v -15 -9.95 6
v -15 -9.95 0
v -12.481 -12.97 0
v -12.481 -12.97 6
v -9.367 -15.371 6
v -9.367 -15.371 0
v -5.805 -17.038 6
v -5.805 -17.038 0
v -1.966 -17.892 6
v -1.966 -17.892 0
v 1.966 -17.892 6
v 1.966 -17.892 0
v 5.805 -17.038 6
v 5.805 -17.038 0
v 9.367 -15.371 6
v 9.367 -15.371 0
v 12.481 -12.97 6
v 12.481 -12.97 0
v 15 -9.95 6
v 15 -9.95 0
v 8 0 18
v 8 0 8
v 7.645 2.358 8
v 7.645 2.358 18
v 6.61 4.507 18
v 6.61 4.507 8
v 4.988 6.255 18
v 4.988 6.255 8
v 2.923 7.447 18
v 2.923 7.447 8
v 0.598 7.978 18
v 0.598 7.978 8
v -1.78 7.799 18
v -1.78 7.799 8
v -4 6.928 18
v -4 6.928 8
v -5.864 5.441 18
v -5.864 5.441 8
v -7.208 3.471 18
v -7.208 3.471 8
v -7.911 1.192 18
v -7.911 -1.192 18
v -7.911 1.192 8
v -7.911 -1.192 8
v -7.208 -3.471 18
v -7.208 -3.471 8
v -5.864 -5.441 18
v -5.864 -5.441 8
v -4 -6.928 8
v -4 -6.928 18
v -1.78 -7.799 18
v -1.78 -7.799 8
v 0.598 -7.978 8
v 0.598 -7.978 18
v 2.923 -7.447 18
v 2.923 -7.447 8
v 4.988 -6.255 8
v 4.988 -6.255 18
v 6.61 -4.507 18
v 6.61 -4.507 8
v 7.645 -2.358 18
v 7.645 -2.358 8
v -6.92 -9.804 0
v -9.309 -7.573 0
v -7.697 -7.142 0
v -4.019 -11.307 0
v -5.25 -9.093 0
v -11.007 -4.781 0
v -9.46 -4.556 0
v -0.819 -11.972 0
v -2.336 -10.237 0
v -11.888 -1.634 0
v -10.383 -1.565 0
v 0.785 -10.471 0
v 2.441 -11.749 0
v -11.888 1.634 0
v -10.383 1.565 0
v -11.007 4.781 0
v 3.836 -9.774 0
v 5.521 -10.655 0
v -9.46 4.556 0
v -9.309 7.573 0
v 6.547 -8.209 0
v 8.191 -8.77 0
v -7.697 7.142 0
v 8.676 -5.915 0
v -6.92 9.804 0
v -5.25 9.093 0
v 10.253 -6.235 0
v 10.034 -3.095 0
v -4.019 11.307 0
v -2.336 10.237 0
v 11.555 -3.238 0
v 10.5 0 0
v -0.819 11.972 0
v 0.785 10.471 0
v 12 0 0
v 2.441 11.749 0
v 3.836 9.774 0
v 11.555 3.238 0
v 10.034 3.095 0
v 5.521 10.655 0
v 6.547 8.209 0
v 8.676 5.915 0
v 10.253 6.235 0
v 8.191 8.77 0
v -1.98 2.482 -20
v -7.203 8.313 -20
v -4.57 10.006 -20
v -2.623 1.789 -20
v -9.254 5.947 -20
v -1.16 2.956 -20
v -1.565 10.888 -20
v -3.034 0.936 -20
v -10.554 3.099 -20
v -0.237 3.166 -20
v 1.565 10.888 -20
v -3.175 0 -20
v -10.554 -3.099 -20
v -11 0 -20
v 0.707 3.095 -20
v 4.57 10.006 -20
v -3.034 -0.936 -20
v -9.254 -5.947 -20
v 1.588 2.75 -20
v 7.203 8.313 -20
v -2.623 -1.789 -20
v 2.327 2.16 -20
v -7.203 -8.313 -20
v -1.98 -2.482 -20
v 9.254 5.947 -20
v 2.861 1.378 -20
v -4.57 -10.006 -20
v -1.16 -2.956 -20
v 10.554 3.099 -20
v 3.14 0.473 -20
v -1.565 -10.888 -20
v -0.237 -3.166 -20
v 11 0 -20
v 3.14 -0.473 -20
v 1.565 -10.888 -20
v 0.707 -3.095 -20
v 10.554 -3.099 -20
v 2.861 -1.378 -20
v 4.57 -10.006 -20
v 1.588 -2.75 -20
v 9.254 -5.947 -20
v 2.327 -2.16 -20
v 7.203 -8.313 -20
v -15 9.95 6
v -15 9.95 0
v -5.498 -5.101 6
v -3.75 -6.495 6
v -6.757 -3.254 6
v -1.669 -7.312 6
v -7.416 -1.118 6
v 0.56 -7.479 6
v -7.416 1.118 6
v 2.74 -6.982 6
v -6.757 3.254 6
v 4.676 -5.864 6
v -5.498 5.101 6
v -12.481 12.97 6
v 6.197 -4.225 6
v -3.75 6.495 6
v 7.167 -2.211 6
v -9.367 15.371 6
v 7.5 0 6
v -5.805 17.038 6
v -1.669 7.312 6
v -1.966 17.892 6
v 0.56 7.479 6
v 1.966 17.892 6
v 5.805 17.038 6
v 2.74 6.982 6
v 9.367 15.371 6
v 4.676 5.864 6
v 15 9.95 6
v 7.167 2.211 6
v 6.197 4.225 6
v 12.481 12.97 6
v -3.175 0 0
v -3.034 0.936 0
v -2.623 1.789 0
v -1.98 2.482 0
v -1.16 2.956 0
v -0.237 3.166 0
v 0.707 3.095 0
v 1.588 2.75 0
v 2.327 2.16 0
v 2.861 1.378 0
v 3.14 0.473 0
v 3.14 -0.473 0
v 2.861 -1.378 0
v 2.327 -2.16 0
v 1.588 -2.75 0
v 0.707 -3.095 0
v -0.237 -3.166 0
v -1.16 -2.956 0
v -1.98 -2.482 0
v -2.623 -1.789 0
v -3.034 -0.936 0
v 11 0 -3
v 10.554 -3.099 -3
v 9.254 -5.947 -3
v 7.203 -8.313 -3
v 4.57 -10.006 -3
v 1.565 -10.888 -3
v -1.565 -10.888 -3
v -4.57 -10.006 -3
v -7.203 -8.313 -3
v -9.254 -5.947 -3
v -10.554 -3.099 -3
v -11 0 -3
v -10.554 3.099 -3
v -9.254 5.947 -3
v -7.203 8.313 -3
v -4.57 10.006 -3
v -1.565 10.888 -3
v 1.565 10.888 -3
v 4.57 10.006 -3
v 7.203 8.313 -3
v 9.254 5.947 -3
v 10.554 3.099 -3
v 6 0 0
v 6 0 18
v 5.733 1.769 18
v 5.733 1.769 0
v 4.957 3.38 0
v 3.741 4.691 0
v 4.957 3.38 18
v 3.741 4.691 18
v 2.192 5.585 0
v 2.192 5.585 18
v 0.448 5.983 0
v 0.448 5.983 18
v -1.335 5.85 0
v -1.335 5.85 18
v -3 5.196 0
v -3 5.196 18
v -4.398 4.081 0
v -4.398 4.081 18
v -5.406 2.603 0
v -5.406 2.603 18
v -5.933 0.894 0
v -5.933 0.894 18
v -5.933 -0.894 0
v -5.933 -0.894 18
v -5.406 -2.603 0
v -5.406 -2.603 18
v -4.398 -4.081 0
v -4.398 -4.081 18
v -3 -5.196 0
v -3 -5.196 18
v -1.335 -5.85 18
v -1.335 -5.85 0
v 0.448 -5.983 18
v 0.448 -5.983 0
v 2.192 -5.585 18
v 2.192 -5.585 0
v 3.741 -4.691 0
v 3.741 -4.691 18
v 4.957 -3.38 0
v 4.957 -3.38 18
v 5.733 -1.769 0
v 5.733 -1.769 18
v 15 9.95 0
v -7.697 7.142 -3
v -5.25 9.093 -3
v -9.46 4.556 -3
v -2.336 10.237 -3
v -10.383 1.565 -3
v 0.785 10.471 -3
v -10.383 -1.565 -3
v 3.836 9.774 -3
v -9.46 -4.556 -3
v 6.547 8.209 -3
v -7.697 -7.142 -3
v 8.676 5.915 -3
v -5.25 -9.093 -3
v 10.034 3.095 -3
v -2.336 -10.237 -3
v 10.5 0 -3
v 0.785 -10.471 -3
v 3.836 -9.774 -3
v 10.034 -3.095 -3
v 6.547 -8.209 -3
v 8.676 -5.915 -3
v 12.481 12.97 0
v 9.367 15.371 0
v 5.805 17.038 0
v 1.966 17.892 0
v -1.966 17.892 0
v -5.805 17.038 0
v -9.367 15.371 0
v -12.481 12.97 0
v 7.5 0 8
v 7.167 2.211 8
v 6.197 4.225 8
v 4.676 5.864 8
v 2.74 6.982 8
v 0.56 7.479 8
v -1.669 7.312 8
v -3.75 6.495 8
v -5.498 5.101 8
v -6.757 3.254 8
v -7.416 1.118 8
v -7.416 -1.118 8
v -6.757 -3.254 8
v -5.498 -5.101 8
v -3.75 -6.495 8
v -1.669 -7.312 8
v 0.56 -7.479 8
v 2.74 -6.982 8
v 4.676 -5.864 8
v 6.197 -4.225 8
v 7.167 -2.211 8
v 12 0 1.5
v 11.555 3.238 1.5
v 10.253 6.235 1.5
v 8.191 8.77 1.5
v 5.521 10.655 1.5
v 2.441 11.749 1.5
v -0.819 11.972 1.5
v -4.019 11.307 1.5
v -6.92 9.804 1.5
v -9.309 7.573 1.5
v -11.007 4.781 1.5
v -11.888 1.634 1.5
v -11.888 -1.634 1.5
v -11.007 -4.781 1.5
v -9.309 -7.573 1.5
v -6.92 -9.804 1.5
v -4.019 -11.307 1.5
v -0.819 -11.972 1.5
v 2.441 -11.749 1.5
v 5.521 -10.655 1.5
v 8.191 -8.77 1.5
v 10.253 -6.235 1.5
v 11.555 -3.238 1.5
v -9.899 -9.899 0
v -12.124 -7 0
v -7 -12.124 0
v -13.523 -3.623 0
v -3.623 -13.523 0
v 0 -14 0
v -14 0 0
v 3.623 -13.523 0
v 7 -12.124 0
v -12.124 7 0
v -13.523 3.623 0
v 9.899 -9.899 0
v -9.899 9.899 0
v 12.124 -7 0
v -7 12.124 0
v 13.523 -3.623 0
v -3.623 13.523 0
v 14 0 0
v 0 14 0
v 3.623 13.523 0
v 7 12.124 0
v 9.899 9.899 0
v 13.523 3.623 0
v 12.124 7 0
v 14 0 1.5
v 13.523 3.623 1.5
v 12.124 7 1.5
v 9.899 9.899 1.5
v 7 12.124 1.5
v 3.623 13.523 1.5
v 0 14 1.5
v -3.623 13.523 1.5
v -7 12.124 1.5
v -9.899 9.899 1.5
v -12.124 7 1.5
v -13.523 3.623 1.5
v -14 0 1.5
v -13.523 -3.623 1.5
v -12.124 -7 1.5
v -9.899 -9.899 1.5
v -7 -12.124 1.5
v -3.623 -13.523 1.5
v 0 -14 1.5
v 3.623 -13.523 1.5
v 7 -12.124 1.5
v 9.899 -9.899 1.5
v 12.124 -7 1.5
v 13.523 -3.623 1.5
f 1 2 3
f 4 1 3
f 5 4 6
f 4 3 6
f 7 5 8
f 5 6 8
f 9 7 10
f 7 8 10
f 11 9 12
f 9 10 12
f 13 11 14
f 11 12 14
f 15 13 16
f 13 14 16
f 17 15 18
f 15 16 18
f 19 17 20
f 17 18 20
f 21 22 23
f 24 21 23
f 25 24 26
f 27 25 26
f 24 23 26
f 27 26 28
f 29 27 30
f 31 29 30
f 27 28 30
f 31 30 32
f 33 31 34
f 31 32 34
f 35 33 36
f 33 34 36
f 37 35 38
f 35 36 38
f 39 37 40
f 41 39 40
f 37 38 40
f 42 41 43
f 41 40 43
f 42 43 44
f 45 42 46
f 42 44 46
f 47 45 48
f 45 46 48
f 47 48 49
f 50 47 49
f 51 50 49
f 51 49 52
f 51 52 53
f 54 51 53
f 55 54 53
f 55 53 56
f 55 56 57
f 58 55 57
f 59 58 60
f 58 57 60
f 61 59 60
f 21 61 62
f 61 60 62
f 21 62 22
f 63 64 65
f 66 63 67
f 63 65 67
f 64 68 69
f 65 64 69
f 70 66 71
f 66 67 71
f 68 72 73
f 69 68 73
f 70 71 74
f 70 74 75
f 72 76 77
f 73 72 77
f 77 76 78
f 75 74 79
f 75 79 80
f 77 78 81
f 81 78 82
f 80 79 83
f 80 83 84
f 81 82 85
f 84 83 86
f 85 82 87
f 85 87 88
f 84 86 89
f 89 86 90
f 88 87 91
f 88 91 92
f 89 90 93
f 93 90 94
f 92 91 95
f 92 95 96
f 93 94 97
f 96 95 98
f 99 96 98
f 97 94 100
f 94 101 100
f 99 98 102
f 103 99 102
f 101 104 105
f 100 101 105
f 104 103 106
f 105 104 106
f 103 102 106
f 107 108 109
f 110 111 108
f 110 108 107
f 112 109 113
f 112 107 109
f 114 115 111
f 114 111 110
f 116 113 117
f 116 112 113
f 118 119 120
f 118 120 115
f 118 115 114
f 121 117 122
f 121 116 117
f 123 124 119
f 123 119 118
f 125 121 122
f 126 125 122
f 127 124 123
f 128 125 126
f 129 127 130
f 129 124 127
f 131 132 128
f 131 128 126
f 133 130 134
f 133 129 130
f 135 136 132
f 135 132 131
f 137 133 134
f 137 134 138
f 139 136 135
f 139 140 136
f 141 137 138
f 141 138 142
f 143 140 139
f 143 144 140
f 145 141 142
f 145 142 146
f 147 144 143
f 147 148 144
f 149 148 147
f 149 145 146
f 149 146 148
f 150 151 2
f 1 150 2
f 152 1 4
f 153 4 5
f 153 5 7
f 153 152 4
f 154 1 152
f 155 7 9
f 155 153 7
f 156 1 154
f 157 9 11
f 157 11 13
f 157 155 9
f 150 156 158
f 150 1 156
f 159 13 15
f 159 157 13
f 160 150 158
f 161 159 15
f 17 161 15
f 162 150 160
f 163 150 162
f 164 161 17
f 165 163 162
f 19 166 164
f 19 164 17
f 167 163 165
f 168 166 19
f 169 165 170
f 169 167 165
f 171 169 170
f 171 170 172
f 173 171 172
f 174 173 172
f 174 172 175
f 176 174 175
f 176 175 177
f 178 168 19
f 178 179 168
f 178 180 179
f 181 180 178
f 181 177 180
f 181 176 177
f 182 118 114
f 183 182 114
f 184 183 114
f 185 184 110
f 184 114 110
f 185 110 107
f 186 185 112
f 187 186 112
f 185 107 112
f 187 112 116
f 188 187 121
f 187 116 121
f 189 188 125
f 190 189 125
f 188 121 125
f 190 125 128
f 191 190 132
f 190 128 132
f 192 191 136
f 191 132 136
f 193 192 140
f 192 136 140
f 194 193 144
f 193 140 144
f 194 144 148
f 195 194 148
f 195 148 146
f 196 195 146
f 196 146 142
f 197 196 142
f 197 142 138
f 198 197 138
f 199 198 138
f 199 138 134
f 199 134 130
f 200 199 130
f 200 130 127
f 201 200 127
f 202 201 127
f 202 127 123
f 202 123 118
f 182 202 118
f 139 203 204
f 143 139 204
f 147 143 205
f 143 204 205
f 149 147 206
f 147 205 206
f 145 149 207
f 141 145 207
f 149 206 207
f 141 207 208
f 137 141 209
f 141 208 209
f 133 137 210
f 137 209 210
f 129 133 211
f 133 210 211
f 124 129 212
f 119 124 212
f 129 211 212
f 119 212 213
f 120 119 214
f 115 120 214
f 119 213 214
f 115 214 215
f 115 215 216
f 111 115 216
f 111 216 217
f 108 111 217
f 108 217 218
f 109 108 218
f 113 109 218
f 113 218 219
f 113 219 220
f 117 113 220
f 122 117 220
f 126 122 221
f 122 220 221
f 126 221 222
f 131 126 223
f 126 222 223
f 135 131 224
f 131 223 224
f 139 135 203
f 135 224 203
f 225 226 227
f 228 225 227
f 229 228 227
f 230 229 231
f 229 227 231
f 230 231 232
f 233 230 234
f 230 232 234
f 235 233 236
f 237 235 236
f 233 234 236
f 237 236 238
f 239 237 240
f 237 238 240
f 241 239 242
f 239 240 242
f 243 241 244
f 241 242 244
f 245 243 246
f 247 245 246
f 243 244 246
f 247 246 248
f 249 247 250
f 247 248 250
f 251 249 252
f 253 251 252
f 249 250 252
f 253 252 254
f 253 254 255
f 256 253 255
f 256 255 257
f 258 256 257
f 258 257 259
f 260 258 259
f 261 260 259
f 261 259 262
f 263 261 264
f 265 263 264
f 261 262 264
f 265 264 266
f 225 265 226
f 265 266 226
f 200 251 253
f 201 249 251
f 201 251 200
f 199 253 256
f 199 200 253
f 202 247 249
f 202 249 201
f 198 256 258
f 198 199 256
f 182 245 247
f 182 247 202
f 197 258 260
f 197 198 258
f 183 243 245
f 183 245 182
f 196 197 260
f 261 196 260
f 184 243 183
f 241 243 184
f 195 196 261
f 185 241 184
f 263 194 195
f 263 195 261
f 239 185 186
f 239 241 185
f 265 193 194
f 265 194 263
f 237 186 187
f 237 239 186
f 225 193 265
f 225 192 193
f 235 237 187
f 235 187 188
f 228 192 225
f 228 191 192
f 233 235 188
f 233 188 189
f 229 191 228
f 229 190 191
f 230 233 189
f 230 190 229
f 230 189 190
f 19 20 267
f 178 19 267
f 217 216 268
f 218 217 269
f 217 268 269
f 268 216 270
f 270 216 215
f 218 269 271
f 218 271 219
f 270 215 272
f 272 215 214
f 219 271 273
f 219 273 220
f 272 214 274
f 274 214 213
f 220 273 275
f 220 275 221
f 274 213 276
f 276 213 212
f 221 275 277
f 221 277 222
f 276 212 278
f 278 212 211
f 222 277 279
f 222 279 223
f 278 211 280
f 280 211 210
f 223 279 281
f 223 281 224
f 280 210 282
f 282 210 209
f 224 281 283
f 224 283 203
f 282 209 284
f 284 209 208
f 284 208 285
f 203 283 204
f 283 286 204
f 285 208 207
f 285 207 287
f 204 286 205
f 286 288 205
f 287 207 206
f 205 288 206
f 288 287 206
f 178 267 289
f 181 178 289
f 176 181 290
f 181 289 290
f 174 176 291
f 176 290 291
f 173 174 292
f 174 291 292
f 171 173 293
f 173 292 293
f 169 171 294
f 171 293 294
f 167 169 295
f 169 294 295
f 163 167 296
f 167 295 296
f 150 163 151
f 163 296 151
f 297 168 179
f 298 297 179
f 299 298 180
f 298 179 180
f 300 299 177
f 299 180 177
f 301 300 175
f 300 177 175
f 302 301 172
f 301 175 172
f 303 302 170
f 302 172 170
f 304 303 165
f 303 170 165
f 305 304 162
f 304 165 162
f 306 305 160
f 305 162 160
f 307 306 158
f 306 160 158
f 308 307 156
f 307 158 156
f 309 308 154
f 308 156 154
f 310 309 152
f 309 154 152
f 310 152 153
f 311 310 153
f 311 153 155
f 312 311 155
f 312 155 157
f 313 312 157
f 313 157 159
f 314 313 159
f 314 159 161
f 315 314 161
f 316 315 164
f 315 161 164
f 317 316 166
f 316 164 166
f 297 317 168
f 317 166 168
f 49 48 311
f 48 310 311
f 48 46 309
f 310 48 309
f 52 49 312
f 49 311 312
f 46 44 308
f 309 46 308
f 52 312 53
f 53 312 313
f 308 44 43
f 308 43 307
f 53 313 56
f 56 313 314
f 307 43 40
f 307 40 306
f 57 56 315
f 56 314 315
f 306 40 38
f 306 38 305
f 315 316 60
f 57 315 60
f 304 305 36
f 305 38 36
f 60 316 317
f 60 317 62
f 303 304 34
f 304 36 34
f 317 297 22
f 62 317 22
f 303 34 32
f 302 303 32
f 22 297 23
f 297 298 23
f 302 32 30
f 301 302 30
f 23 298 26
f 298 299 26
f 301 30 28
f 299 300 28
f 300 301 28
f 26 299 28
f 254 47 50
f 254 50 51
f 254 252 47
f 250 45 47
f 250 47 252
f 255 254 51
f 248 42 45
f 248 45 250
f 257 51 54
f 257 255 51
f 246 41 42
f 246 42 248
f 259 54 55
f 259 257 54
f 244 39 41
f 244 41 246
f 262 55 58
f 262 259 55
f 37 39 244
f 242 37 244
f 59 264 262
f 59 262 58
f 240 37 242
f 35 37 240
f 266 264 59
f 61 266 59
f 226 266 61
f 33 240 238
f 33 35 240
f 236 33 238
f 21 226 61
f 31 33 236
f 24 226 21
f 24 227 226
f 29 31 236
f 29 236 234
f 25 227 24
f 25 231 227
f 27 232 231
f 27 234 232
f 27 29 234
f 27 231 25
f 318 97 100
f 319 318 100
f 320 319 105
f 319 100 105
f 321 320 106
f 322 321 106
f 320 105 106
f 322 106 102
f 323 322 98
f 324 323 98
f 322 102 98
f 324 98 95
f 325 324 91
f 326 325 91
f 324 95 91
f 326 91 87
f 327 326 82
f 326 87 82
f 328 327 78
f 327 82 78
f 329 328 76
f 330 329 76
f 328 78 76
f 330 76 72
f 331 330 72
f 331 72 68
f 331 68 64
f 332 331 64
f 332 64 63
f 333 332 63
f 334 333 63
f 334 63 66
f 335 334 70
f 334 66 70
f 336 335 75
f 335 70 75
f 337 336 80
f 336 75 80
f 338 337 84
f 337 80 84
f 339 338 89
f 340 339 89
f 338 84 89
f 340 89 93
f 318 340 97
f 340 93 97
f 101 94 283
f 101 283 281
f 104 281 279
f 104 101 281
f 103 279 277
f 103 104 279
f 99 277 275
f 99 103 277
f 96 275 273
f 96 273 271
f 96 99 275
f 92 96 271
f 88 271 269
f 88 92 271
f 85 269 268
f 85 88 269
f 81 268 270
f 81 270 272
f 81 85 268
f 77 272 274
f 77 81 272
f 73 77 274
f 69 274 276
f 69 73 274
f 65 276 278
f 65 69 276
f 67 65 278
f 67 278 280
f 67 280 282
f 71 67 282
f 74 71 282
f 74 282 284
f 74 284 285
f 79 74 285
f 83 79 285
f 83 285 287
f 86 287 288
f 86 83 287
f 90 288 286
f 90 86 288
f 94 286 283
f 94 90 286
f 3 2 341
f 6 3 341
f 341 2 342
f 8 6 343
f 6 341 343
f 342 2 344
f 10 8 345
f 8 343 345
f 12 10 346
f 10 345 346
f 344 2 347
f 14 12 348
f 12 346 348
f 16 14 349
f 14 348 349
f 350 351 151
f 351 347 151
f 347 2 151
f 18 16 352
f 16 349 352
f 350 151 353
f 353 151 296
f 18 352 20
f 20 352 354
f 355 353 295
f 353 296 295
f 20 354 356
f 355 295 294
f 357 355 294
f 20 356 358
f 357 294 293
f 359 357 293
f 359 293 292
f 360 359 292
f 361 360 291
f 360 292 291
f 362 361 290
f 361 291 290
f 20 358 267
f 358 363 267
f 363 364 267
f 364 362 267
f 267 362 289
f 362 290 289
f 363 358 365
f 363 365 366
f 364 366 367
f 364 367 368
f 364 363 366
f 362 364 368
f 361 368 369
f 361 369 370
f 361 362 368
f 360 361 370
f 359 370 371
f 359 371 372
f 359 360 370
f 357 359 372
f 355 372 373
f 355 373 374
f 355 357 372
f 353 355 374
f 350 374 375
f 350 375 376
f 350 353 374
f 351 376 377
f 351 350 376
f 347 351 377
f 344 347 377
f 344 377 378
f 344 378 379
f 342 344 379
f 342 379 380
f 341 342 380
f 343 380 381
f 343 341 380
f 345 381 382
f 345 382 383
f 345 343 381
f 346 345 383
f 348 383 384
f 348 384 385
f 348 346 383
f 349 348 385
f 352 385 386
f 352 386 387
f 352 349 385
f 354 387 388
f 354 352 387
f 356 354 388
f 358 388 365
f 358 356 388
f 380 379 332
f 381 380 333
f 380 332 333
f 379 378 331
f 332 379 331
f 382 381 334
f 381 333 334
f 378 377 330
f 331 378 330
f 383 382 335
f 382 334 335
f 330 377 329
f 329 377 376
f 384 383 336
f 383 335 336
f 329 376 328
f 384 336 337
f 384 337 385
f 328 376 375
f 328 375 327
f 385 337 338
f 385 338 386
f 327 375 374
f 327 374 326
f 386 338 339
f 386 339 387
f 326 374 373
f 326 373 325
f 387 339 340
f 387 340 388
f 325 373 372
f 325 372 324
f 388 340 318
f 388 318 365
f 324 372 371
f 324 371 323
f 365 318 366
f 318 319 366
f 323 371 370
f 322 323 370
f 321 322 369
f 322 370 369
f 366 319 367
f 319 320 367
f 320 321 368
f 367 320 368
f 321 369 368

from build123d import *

# Parameters (mm, degrees)
F1_DEPTH  = 6
F2_R      = 14
F2_R_2    = 12
F3_DEPTH  = 1.5
F4_R      = 10.5
F5_DEPTH  = 3
F7_R      = 11
F8_DEPTH  = 17
F10_R     = 7.5
F11_DEPTH = 2
F13_R     = 8
F14_DEPTH = 10
F17_D     = 6.35
F18_R     = 6
F19_DEPTH = 18


with BuildPart() as f1:
    # F0 (on Top) → F1 (new body)
    with BuildSketch(Plane.XY):
        with BuildLine():
            Line((15, -9.949874), (15, 9.949874))
            ThreePointArc((15, 9.949874), (0, 18), (-15, 9.949874))
            Line((-15, 9.949874), (-15, -9.949874))
            ThreePointArc((-15, -9.949874), (0, -18), (15, -9.949874))
        make_face()
    extrude(amount=F1_DEPTH)

    # F2 (on Top) → F3 (cut)
    with BuildSketch(Plane.XY):
        Circle(F2_R)
        Circle(F2_R_2, mode=Mode.SUBTRACT)
    extrude(amount=F3_DEPTH, mode=Mode.SUBTRACT)

    # F4 (on Top) → F5 (join)
    with BuildSketch(Plane.XY):
        Circle(F4_R)
    extrude(amount=-F5_DEPTH)

    # F7 (on offset) → F8 (join)
    with BuildSketch(Plane(origin=(0, 0, -3), x_dir=(1, 0, 0), z_dir=(0, 0, -1))):
        Circle(F7_R)
    extrude(amount=F8_DEPTH)

    # F10 (on offset) → F11 (join)
    with BuildSketch(Plane.XY.offset(6)):
        Circle(F10_R)
    extrude(amount=F11_DEPTH)

    # F13 (on offset) → F14 (join)
    with BuildSketch(Plane.XY.offset(8)):
        Circle(F13_R)
    extrude(amount=F14_DEPTH)

    # F17 (through all)
    with Locations(Plane.XY.offset(18)):
        with Locations((0, 0)):
            Hole(F17_D / 2)

    # F18 (on offset) → F19 (cut)
    with BuildSketch(Plane.XY.offset(18)):
        Circle(F18_R)
    extrude(amount=-F19_DEPTH, mode=Mode.SUBTRACT)


solid = f1.part
